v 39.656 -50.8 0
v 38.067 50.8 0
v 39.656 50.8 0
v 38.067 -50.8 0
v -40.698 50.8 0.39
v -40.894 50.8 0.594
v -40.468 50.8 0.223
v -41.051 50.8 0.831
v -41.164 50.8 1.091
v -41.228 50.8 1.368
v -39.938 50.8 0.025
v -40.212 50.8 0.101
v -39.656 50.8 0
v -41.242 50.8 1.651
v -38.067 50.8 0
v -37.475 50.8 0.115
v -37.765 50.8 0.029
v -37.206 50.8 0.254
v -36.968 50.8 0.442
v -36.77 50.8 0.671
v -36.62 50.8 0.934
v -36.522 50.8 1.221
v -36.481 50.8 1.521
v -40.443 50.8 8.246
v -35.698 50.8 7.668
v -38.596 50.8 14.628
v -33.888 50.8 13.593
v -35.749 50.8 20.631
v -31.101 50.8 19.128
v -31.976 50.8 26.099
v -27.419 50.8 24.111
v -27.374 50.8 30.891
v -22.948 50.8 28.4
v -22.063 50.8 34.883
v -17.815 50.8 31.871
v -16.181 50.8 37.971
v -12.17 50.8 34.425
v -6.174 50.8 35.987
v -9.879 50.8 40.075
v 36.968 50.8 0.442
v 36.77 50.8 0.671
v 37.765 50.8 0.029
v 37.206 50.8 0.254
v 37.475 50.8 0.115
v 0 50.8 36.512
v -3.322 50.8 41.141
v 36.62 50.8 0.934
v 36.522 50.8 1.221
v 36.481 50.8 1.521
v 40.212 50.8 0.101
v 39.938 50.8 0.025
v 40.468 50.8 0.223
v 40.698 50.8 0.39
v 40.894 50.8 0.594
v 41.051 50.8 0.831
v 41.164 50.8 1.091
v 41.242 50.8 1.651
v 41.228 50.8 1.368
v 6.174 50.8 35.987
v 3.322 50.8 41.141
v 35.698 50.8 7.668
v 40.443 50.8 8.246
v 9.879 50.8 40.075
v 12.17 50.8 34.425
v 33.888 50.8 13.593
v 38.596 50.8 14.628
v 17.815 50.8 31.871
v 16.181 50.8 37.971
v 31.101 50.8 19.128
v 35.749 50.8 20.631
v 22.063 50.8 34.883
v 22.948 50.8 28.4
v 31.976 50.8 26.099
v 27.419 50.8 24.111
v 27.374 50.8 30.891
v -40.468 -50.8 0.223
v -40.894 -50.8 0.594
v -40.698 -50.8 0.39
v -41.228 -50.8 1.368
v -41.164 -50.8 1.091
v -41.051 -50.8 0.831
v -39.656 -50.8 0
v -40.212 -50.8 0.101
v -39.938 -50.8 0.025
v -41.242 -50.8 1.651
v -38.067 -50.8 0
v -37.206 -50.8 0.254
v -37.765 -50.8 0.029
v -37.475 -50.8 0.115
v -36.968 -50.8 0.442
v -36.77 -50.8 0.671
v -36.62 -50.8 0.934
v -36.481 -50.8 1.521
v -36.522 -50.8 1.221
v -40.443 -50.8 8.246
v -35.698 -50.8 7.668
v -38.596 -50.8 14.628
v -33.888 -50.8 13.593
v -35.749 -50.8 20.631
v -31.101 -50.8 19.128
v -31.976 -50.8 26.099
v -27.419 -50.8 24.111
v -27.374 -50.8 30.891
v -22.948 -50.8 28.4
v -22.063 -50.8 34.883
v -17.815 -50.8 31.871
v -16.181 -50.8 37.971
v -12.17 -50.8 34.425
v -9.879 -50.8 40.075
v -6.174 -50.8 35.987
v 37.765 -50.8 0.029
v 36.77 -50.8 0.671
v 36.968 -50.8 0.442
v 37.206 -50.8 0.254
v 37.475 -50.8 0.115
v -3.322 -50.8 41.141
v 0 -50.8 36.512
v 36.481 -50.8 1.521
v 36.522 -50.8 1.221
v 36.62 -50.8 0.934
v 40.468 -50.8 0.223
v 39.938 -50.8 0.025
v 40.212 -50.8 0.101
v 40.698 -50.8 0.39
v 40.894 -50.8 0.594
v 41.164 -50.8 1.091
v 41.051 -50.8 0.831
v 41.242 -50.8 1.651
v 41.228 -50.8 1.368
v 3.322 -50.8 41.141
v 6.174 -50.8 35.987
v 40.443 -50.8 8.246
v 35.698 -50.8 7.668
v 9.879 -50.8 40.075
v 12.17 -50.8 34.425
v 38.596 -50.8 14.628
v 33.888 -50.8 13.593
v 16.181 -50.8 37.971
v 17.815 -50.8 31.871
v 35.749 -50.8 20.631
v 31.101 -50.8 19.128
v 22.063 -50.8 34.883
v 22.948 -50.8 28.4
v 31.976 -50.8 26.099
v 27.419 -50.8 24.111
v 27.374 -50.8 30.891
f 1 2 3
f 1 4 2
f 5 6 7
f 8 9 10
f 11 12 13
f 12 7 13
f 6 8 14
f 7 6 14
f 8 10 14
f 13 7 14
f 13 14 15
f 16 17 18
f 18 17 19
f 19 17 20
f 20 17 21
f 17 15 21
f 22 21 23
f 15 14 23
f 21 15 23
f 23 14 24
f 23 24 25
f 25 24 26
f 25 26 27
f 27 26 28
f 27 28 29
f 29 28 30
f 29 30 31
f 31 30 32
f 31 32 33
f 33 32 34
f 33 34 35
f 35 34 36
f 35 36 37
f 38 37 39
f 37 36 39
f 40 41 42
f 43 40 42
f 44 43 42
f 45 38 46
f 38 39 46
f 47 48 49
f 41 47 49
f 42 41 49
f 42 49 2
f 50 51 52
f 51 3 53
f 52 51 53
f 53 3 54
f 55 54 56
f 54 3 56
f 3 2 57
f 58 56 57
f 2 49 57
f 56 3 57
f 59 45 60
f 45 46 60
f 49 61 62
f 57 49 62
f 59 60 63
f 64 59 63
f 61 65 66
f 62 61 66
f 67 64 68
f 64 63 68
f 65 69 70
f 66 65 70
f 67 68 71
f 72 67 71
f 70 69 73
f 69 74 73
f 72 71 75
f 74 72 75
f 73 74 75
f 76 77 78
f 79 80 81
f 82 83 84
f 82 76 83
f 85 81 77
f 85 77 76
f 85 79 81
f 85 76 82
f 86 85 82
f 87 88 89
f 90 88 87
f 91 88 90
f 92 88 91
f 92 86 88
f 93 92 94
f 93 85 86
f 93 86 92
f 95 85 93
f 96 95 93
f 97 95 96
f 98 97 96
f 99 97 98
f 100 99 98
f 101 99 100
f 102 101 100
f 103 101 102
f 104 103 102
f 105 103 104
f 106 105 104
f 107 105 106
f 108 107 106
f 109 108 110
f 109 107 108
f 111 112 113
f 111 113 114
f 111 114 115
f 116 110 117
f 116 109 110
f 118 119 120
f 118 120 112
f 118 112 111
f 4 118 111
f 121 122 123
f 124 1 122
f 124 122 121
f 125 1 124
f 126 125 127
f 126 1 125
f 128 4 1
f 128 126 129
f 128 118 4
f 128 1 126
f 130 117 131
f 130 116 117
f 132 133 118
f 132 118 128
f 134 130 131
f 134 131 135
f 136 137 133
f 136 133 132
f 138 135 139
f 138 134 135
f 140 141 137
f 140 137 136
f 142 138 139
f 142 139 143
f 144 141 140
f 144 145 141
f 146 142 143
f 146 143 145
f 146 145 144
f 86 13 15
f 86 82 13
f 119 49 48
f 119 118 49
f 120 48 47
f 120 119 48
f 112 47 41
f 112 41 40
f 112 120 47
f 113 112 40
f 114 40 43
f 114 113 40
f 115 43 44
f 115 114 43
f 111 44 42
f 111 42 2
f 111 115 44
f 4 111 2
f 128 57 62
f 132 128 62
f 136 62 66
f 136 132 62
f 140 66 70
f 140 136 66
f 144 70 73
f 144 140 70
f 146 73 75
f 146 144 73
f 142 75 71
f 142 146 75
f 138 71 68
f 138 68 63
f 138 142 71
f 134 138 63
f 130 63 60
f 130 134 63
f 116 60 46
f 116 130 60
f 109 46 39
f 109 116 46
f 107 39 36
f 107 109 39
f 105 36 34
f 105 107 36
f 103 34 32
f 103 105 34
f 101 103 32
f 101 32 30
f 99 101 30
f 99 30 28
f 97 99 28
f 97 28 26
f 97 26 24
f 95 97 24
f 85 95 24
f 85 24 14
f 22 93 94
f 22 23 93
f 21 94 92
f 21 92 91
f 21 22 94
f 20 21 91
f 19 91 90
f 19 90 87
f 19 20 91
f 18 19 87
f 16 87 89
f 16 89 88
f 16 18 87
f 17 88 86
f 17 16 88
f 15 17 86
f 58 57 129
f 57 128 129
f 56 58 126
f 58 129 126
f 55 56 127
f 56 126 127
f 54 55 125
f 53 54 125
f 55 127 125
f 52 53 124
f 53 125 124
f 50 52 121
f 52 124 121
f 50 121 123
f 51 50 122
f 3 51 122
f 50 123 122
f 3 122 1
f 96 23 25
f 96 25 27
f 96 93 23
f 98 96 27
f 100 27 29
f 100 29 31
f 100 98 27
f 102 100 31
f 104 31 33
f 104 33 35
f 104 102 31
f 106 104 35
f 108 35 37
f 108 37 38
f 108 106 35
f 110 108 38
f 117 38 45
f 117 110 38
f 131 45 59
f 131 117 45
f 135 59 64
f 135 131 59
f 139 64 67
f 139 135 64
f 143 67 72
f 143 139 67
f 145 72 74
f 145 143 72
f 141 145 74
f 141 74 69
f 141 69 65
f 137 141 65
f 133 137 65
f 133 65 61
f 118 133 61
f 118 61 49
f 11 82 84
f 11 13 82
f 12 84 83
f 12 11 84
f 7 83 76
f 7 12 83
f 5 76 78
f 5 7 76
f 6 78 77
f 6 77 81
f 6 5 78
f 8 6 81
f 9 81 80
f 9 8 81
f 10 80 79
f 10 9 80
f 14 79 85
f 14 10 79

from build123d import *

# Parameters (mm, degrees)
F1_DEPTH = 50.8
F2_R     = 1.5875


with BuildPart() as f1:
    # F0 (on Front) → F1 (new body, symmetric)
    with BuildSketch(Plane.XZ):
        with BuildLine():
            ThreePointArc((-36.5125, 0), (0, 36.5125), (36.5125, 0))
            Line((36.5125, 0), (41.275, 0))
            ThreePointArc((41.275, 0), (0, 41.275), (-41.275, 0))
            Line((-41.275, 0), (-36.5125, 0))
        make_face()
    extrude(amount=F1_DEPTH, both=True)

    # F2
    f2_edges = [f1.edges().sort_by_distance(p)[0] for p in [
        (-41.275, 0, 0),
        (-36.5125, 0, 0),
        (36.5125, 0, 0),
        (41.275, 0, 0),
    ]]
    fillet(f2_edges, radius=F2_R)


solid = f1.part
